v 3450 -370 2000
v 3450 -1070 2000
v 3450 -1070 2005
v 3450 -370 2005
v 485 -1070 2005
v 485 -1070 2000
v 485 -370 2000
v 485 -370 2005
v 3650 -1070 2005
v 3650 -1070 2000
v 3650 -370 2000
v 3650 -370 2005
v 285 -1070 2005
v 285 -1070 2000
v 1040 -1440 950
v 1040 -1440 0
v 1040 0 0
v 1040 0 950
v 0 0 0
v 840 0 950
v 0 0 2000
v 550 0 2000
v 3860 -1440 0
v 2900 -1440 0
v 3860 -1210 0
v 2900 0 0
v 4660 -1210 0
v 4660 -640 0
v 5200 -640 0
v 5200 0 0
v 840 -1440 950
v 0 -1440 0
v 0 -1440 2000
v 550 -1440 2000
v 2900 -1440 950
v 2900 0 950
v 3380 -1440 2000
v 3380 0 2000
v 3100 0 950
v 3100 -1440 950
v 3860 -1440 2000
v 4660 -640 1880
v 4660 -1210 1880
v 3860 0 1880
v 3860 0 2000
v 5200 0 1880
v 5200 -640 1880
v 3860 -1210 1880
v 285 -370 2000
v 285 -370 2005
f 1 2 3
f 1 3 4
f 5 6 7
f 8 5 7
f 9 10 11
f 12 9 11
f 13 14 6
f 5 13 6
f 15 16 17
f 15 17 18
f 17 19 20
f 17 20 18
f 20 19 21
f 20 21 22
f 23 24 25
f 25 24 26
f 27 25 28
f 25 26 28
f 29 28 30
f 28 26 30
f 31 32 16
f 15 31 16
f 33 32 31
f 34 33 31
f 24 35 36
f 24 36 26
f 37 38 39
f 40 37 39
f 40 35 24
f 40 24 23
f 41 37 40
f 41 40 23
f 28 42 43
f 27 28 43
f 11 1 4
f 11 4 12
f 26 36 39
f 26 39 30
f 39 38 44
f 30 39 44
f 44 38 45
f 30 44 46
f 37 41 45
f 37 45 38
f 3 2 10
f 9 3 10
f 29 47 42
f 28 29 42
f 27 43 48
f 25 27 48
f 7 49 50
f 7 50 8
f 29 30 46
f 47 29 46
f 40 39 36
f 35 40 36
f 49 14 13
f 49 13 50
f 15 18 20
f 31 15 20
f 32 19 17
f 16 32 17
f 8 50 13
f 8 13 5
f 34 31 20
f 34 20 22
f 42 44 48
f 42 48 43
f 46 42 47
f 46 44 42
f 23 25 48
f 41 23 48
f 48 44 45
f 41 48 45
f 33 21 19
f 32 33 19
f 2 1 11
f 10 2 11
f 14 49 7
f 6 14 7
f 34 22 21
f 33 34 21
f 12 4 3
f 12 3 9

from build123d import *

# Parameters (mm, degrees)
F0_W     = 1340
F0_H     = 1880
F1_DEPTH = 1440
F3_DEPTH = 2080
F4_W     = 200
F4_H     = 700
F5_DEPTH = 5


with BuildPart() as f1:
    # F0 (on Front) → F1 (new body)
    with BuildSketch(Plane.XZ):
        Polygon((0, 2000), (0, 0), (1040, 0), (1040, 950), (840, 950), (550, 2000), align=None)
        Polygon((3860, 1880), (3860, 2000), (3380, 2000), (3100, 950), (2900, 950), (2900, 0), (3860, 0), align=None)
        with Locations((4530, 940)):
            Rectangle(F0_W, F0_H)
    extrude(amount=F1_DEPTH)

    # F2 (on face) → F3 (cut)
    with BuildSketch(Plane.XY.offset(1880)):
        Polygon((3860, -1210), (3860, -1440), (5200, -1440), (5200, -640), (4660, -640), (4660, -1210), align=None)
    extrude(amount=-F3_DEPTH, mode=Mode.SUBTRACT)


with BuildPart() as f5:
    # F4 (on face) → F5 (new body)
    with BuildSketch(Plane.XY.offset(2000)):
        with Locations((385, -720)):
            Rectangle(F4_W, F4_H)
        with Locations((3550, -720)):
            Rectangle(F4_W, F4_H)
    extrude(amount=F5_DEPTH)


solid = Compound([f1.part, f5.part])
